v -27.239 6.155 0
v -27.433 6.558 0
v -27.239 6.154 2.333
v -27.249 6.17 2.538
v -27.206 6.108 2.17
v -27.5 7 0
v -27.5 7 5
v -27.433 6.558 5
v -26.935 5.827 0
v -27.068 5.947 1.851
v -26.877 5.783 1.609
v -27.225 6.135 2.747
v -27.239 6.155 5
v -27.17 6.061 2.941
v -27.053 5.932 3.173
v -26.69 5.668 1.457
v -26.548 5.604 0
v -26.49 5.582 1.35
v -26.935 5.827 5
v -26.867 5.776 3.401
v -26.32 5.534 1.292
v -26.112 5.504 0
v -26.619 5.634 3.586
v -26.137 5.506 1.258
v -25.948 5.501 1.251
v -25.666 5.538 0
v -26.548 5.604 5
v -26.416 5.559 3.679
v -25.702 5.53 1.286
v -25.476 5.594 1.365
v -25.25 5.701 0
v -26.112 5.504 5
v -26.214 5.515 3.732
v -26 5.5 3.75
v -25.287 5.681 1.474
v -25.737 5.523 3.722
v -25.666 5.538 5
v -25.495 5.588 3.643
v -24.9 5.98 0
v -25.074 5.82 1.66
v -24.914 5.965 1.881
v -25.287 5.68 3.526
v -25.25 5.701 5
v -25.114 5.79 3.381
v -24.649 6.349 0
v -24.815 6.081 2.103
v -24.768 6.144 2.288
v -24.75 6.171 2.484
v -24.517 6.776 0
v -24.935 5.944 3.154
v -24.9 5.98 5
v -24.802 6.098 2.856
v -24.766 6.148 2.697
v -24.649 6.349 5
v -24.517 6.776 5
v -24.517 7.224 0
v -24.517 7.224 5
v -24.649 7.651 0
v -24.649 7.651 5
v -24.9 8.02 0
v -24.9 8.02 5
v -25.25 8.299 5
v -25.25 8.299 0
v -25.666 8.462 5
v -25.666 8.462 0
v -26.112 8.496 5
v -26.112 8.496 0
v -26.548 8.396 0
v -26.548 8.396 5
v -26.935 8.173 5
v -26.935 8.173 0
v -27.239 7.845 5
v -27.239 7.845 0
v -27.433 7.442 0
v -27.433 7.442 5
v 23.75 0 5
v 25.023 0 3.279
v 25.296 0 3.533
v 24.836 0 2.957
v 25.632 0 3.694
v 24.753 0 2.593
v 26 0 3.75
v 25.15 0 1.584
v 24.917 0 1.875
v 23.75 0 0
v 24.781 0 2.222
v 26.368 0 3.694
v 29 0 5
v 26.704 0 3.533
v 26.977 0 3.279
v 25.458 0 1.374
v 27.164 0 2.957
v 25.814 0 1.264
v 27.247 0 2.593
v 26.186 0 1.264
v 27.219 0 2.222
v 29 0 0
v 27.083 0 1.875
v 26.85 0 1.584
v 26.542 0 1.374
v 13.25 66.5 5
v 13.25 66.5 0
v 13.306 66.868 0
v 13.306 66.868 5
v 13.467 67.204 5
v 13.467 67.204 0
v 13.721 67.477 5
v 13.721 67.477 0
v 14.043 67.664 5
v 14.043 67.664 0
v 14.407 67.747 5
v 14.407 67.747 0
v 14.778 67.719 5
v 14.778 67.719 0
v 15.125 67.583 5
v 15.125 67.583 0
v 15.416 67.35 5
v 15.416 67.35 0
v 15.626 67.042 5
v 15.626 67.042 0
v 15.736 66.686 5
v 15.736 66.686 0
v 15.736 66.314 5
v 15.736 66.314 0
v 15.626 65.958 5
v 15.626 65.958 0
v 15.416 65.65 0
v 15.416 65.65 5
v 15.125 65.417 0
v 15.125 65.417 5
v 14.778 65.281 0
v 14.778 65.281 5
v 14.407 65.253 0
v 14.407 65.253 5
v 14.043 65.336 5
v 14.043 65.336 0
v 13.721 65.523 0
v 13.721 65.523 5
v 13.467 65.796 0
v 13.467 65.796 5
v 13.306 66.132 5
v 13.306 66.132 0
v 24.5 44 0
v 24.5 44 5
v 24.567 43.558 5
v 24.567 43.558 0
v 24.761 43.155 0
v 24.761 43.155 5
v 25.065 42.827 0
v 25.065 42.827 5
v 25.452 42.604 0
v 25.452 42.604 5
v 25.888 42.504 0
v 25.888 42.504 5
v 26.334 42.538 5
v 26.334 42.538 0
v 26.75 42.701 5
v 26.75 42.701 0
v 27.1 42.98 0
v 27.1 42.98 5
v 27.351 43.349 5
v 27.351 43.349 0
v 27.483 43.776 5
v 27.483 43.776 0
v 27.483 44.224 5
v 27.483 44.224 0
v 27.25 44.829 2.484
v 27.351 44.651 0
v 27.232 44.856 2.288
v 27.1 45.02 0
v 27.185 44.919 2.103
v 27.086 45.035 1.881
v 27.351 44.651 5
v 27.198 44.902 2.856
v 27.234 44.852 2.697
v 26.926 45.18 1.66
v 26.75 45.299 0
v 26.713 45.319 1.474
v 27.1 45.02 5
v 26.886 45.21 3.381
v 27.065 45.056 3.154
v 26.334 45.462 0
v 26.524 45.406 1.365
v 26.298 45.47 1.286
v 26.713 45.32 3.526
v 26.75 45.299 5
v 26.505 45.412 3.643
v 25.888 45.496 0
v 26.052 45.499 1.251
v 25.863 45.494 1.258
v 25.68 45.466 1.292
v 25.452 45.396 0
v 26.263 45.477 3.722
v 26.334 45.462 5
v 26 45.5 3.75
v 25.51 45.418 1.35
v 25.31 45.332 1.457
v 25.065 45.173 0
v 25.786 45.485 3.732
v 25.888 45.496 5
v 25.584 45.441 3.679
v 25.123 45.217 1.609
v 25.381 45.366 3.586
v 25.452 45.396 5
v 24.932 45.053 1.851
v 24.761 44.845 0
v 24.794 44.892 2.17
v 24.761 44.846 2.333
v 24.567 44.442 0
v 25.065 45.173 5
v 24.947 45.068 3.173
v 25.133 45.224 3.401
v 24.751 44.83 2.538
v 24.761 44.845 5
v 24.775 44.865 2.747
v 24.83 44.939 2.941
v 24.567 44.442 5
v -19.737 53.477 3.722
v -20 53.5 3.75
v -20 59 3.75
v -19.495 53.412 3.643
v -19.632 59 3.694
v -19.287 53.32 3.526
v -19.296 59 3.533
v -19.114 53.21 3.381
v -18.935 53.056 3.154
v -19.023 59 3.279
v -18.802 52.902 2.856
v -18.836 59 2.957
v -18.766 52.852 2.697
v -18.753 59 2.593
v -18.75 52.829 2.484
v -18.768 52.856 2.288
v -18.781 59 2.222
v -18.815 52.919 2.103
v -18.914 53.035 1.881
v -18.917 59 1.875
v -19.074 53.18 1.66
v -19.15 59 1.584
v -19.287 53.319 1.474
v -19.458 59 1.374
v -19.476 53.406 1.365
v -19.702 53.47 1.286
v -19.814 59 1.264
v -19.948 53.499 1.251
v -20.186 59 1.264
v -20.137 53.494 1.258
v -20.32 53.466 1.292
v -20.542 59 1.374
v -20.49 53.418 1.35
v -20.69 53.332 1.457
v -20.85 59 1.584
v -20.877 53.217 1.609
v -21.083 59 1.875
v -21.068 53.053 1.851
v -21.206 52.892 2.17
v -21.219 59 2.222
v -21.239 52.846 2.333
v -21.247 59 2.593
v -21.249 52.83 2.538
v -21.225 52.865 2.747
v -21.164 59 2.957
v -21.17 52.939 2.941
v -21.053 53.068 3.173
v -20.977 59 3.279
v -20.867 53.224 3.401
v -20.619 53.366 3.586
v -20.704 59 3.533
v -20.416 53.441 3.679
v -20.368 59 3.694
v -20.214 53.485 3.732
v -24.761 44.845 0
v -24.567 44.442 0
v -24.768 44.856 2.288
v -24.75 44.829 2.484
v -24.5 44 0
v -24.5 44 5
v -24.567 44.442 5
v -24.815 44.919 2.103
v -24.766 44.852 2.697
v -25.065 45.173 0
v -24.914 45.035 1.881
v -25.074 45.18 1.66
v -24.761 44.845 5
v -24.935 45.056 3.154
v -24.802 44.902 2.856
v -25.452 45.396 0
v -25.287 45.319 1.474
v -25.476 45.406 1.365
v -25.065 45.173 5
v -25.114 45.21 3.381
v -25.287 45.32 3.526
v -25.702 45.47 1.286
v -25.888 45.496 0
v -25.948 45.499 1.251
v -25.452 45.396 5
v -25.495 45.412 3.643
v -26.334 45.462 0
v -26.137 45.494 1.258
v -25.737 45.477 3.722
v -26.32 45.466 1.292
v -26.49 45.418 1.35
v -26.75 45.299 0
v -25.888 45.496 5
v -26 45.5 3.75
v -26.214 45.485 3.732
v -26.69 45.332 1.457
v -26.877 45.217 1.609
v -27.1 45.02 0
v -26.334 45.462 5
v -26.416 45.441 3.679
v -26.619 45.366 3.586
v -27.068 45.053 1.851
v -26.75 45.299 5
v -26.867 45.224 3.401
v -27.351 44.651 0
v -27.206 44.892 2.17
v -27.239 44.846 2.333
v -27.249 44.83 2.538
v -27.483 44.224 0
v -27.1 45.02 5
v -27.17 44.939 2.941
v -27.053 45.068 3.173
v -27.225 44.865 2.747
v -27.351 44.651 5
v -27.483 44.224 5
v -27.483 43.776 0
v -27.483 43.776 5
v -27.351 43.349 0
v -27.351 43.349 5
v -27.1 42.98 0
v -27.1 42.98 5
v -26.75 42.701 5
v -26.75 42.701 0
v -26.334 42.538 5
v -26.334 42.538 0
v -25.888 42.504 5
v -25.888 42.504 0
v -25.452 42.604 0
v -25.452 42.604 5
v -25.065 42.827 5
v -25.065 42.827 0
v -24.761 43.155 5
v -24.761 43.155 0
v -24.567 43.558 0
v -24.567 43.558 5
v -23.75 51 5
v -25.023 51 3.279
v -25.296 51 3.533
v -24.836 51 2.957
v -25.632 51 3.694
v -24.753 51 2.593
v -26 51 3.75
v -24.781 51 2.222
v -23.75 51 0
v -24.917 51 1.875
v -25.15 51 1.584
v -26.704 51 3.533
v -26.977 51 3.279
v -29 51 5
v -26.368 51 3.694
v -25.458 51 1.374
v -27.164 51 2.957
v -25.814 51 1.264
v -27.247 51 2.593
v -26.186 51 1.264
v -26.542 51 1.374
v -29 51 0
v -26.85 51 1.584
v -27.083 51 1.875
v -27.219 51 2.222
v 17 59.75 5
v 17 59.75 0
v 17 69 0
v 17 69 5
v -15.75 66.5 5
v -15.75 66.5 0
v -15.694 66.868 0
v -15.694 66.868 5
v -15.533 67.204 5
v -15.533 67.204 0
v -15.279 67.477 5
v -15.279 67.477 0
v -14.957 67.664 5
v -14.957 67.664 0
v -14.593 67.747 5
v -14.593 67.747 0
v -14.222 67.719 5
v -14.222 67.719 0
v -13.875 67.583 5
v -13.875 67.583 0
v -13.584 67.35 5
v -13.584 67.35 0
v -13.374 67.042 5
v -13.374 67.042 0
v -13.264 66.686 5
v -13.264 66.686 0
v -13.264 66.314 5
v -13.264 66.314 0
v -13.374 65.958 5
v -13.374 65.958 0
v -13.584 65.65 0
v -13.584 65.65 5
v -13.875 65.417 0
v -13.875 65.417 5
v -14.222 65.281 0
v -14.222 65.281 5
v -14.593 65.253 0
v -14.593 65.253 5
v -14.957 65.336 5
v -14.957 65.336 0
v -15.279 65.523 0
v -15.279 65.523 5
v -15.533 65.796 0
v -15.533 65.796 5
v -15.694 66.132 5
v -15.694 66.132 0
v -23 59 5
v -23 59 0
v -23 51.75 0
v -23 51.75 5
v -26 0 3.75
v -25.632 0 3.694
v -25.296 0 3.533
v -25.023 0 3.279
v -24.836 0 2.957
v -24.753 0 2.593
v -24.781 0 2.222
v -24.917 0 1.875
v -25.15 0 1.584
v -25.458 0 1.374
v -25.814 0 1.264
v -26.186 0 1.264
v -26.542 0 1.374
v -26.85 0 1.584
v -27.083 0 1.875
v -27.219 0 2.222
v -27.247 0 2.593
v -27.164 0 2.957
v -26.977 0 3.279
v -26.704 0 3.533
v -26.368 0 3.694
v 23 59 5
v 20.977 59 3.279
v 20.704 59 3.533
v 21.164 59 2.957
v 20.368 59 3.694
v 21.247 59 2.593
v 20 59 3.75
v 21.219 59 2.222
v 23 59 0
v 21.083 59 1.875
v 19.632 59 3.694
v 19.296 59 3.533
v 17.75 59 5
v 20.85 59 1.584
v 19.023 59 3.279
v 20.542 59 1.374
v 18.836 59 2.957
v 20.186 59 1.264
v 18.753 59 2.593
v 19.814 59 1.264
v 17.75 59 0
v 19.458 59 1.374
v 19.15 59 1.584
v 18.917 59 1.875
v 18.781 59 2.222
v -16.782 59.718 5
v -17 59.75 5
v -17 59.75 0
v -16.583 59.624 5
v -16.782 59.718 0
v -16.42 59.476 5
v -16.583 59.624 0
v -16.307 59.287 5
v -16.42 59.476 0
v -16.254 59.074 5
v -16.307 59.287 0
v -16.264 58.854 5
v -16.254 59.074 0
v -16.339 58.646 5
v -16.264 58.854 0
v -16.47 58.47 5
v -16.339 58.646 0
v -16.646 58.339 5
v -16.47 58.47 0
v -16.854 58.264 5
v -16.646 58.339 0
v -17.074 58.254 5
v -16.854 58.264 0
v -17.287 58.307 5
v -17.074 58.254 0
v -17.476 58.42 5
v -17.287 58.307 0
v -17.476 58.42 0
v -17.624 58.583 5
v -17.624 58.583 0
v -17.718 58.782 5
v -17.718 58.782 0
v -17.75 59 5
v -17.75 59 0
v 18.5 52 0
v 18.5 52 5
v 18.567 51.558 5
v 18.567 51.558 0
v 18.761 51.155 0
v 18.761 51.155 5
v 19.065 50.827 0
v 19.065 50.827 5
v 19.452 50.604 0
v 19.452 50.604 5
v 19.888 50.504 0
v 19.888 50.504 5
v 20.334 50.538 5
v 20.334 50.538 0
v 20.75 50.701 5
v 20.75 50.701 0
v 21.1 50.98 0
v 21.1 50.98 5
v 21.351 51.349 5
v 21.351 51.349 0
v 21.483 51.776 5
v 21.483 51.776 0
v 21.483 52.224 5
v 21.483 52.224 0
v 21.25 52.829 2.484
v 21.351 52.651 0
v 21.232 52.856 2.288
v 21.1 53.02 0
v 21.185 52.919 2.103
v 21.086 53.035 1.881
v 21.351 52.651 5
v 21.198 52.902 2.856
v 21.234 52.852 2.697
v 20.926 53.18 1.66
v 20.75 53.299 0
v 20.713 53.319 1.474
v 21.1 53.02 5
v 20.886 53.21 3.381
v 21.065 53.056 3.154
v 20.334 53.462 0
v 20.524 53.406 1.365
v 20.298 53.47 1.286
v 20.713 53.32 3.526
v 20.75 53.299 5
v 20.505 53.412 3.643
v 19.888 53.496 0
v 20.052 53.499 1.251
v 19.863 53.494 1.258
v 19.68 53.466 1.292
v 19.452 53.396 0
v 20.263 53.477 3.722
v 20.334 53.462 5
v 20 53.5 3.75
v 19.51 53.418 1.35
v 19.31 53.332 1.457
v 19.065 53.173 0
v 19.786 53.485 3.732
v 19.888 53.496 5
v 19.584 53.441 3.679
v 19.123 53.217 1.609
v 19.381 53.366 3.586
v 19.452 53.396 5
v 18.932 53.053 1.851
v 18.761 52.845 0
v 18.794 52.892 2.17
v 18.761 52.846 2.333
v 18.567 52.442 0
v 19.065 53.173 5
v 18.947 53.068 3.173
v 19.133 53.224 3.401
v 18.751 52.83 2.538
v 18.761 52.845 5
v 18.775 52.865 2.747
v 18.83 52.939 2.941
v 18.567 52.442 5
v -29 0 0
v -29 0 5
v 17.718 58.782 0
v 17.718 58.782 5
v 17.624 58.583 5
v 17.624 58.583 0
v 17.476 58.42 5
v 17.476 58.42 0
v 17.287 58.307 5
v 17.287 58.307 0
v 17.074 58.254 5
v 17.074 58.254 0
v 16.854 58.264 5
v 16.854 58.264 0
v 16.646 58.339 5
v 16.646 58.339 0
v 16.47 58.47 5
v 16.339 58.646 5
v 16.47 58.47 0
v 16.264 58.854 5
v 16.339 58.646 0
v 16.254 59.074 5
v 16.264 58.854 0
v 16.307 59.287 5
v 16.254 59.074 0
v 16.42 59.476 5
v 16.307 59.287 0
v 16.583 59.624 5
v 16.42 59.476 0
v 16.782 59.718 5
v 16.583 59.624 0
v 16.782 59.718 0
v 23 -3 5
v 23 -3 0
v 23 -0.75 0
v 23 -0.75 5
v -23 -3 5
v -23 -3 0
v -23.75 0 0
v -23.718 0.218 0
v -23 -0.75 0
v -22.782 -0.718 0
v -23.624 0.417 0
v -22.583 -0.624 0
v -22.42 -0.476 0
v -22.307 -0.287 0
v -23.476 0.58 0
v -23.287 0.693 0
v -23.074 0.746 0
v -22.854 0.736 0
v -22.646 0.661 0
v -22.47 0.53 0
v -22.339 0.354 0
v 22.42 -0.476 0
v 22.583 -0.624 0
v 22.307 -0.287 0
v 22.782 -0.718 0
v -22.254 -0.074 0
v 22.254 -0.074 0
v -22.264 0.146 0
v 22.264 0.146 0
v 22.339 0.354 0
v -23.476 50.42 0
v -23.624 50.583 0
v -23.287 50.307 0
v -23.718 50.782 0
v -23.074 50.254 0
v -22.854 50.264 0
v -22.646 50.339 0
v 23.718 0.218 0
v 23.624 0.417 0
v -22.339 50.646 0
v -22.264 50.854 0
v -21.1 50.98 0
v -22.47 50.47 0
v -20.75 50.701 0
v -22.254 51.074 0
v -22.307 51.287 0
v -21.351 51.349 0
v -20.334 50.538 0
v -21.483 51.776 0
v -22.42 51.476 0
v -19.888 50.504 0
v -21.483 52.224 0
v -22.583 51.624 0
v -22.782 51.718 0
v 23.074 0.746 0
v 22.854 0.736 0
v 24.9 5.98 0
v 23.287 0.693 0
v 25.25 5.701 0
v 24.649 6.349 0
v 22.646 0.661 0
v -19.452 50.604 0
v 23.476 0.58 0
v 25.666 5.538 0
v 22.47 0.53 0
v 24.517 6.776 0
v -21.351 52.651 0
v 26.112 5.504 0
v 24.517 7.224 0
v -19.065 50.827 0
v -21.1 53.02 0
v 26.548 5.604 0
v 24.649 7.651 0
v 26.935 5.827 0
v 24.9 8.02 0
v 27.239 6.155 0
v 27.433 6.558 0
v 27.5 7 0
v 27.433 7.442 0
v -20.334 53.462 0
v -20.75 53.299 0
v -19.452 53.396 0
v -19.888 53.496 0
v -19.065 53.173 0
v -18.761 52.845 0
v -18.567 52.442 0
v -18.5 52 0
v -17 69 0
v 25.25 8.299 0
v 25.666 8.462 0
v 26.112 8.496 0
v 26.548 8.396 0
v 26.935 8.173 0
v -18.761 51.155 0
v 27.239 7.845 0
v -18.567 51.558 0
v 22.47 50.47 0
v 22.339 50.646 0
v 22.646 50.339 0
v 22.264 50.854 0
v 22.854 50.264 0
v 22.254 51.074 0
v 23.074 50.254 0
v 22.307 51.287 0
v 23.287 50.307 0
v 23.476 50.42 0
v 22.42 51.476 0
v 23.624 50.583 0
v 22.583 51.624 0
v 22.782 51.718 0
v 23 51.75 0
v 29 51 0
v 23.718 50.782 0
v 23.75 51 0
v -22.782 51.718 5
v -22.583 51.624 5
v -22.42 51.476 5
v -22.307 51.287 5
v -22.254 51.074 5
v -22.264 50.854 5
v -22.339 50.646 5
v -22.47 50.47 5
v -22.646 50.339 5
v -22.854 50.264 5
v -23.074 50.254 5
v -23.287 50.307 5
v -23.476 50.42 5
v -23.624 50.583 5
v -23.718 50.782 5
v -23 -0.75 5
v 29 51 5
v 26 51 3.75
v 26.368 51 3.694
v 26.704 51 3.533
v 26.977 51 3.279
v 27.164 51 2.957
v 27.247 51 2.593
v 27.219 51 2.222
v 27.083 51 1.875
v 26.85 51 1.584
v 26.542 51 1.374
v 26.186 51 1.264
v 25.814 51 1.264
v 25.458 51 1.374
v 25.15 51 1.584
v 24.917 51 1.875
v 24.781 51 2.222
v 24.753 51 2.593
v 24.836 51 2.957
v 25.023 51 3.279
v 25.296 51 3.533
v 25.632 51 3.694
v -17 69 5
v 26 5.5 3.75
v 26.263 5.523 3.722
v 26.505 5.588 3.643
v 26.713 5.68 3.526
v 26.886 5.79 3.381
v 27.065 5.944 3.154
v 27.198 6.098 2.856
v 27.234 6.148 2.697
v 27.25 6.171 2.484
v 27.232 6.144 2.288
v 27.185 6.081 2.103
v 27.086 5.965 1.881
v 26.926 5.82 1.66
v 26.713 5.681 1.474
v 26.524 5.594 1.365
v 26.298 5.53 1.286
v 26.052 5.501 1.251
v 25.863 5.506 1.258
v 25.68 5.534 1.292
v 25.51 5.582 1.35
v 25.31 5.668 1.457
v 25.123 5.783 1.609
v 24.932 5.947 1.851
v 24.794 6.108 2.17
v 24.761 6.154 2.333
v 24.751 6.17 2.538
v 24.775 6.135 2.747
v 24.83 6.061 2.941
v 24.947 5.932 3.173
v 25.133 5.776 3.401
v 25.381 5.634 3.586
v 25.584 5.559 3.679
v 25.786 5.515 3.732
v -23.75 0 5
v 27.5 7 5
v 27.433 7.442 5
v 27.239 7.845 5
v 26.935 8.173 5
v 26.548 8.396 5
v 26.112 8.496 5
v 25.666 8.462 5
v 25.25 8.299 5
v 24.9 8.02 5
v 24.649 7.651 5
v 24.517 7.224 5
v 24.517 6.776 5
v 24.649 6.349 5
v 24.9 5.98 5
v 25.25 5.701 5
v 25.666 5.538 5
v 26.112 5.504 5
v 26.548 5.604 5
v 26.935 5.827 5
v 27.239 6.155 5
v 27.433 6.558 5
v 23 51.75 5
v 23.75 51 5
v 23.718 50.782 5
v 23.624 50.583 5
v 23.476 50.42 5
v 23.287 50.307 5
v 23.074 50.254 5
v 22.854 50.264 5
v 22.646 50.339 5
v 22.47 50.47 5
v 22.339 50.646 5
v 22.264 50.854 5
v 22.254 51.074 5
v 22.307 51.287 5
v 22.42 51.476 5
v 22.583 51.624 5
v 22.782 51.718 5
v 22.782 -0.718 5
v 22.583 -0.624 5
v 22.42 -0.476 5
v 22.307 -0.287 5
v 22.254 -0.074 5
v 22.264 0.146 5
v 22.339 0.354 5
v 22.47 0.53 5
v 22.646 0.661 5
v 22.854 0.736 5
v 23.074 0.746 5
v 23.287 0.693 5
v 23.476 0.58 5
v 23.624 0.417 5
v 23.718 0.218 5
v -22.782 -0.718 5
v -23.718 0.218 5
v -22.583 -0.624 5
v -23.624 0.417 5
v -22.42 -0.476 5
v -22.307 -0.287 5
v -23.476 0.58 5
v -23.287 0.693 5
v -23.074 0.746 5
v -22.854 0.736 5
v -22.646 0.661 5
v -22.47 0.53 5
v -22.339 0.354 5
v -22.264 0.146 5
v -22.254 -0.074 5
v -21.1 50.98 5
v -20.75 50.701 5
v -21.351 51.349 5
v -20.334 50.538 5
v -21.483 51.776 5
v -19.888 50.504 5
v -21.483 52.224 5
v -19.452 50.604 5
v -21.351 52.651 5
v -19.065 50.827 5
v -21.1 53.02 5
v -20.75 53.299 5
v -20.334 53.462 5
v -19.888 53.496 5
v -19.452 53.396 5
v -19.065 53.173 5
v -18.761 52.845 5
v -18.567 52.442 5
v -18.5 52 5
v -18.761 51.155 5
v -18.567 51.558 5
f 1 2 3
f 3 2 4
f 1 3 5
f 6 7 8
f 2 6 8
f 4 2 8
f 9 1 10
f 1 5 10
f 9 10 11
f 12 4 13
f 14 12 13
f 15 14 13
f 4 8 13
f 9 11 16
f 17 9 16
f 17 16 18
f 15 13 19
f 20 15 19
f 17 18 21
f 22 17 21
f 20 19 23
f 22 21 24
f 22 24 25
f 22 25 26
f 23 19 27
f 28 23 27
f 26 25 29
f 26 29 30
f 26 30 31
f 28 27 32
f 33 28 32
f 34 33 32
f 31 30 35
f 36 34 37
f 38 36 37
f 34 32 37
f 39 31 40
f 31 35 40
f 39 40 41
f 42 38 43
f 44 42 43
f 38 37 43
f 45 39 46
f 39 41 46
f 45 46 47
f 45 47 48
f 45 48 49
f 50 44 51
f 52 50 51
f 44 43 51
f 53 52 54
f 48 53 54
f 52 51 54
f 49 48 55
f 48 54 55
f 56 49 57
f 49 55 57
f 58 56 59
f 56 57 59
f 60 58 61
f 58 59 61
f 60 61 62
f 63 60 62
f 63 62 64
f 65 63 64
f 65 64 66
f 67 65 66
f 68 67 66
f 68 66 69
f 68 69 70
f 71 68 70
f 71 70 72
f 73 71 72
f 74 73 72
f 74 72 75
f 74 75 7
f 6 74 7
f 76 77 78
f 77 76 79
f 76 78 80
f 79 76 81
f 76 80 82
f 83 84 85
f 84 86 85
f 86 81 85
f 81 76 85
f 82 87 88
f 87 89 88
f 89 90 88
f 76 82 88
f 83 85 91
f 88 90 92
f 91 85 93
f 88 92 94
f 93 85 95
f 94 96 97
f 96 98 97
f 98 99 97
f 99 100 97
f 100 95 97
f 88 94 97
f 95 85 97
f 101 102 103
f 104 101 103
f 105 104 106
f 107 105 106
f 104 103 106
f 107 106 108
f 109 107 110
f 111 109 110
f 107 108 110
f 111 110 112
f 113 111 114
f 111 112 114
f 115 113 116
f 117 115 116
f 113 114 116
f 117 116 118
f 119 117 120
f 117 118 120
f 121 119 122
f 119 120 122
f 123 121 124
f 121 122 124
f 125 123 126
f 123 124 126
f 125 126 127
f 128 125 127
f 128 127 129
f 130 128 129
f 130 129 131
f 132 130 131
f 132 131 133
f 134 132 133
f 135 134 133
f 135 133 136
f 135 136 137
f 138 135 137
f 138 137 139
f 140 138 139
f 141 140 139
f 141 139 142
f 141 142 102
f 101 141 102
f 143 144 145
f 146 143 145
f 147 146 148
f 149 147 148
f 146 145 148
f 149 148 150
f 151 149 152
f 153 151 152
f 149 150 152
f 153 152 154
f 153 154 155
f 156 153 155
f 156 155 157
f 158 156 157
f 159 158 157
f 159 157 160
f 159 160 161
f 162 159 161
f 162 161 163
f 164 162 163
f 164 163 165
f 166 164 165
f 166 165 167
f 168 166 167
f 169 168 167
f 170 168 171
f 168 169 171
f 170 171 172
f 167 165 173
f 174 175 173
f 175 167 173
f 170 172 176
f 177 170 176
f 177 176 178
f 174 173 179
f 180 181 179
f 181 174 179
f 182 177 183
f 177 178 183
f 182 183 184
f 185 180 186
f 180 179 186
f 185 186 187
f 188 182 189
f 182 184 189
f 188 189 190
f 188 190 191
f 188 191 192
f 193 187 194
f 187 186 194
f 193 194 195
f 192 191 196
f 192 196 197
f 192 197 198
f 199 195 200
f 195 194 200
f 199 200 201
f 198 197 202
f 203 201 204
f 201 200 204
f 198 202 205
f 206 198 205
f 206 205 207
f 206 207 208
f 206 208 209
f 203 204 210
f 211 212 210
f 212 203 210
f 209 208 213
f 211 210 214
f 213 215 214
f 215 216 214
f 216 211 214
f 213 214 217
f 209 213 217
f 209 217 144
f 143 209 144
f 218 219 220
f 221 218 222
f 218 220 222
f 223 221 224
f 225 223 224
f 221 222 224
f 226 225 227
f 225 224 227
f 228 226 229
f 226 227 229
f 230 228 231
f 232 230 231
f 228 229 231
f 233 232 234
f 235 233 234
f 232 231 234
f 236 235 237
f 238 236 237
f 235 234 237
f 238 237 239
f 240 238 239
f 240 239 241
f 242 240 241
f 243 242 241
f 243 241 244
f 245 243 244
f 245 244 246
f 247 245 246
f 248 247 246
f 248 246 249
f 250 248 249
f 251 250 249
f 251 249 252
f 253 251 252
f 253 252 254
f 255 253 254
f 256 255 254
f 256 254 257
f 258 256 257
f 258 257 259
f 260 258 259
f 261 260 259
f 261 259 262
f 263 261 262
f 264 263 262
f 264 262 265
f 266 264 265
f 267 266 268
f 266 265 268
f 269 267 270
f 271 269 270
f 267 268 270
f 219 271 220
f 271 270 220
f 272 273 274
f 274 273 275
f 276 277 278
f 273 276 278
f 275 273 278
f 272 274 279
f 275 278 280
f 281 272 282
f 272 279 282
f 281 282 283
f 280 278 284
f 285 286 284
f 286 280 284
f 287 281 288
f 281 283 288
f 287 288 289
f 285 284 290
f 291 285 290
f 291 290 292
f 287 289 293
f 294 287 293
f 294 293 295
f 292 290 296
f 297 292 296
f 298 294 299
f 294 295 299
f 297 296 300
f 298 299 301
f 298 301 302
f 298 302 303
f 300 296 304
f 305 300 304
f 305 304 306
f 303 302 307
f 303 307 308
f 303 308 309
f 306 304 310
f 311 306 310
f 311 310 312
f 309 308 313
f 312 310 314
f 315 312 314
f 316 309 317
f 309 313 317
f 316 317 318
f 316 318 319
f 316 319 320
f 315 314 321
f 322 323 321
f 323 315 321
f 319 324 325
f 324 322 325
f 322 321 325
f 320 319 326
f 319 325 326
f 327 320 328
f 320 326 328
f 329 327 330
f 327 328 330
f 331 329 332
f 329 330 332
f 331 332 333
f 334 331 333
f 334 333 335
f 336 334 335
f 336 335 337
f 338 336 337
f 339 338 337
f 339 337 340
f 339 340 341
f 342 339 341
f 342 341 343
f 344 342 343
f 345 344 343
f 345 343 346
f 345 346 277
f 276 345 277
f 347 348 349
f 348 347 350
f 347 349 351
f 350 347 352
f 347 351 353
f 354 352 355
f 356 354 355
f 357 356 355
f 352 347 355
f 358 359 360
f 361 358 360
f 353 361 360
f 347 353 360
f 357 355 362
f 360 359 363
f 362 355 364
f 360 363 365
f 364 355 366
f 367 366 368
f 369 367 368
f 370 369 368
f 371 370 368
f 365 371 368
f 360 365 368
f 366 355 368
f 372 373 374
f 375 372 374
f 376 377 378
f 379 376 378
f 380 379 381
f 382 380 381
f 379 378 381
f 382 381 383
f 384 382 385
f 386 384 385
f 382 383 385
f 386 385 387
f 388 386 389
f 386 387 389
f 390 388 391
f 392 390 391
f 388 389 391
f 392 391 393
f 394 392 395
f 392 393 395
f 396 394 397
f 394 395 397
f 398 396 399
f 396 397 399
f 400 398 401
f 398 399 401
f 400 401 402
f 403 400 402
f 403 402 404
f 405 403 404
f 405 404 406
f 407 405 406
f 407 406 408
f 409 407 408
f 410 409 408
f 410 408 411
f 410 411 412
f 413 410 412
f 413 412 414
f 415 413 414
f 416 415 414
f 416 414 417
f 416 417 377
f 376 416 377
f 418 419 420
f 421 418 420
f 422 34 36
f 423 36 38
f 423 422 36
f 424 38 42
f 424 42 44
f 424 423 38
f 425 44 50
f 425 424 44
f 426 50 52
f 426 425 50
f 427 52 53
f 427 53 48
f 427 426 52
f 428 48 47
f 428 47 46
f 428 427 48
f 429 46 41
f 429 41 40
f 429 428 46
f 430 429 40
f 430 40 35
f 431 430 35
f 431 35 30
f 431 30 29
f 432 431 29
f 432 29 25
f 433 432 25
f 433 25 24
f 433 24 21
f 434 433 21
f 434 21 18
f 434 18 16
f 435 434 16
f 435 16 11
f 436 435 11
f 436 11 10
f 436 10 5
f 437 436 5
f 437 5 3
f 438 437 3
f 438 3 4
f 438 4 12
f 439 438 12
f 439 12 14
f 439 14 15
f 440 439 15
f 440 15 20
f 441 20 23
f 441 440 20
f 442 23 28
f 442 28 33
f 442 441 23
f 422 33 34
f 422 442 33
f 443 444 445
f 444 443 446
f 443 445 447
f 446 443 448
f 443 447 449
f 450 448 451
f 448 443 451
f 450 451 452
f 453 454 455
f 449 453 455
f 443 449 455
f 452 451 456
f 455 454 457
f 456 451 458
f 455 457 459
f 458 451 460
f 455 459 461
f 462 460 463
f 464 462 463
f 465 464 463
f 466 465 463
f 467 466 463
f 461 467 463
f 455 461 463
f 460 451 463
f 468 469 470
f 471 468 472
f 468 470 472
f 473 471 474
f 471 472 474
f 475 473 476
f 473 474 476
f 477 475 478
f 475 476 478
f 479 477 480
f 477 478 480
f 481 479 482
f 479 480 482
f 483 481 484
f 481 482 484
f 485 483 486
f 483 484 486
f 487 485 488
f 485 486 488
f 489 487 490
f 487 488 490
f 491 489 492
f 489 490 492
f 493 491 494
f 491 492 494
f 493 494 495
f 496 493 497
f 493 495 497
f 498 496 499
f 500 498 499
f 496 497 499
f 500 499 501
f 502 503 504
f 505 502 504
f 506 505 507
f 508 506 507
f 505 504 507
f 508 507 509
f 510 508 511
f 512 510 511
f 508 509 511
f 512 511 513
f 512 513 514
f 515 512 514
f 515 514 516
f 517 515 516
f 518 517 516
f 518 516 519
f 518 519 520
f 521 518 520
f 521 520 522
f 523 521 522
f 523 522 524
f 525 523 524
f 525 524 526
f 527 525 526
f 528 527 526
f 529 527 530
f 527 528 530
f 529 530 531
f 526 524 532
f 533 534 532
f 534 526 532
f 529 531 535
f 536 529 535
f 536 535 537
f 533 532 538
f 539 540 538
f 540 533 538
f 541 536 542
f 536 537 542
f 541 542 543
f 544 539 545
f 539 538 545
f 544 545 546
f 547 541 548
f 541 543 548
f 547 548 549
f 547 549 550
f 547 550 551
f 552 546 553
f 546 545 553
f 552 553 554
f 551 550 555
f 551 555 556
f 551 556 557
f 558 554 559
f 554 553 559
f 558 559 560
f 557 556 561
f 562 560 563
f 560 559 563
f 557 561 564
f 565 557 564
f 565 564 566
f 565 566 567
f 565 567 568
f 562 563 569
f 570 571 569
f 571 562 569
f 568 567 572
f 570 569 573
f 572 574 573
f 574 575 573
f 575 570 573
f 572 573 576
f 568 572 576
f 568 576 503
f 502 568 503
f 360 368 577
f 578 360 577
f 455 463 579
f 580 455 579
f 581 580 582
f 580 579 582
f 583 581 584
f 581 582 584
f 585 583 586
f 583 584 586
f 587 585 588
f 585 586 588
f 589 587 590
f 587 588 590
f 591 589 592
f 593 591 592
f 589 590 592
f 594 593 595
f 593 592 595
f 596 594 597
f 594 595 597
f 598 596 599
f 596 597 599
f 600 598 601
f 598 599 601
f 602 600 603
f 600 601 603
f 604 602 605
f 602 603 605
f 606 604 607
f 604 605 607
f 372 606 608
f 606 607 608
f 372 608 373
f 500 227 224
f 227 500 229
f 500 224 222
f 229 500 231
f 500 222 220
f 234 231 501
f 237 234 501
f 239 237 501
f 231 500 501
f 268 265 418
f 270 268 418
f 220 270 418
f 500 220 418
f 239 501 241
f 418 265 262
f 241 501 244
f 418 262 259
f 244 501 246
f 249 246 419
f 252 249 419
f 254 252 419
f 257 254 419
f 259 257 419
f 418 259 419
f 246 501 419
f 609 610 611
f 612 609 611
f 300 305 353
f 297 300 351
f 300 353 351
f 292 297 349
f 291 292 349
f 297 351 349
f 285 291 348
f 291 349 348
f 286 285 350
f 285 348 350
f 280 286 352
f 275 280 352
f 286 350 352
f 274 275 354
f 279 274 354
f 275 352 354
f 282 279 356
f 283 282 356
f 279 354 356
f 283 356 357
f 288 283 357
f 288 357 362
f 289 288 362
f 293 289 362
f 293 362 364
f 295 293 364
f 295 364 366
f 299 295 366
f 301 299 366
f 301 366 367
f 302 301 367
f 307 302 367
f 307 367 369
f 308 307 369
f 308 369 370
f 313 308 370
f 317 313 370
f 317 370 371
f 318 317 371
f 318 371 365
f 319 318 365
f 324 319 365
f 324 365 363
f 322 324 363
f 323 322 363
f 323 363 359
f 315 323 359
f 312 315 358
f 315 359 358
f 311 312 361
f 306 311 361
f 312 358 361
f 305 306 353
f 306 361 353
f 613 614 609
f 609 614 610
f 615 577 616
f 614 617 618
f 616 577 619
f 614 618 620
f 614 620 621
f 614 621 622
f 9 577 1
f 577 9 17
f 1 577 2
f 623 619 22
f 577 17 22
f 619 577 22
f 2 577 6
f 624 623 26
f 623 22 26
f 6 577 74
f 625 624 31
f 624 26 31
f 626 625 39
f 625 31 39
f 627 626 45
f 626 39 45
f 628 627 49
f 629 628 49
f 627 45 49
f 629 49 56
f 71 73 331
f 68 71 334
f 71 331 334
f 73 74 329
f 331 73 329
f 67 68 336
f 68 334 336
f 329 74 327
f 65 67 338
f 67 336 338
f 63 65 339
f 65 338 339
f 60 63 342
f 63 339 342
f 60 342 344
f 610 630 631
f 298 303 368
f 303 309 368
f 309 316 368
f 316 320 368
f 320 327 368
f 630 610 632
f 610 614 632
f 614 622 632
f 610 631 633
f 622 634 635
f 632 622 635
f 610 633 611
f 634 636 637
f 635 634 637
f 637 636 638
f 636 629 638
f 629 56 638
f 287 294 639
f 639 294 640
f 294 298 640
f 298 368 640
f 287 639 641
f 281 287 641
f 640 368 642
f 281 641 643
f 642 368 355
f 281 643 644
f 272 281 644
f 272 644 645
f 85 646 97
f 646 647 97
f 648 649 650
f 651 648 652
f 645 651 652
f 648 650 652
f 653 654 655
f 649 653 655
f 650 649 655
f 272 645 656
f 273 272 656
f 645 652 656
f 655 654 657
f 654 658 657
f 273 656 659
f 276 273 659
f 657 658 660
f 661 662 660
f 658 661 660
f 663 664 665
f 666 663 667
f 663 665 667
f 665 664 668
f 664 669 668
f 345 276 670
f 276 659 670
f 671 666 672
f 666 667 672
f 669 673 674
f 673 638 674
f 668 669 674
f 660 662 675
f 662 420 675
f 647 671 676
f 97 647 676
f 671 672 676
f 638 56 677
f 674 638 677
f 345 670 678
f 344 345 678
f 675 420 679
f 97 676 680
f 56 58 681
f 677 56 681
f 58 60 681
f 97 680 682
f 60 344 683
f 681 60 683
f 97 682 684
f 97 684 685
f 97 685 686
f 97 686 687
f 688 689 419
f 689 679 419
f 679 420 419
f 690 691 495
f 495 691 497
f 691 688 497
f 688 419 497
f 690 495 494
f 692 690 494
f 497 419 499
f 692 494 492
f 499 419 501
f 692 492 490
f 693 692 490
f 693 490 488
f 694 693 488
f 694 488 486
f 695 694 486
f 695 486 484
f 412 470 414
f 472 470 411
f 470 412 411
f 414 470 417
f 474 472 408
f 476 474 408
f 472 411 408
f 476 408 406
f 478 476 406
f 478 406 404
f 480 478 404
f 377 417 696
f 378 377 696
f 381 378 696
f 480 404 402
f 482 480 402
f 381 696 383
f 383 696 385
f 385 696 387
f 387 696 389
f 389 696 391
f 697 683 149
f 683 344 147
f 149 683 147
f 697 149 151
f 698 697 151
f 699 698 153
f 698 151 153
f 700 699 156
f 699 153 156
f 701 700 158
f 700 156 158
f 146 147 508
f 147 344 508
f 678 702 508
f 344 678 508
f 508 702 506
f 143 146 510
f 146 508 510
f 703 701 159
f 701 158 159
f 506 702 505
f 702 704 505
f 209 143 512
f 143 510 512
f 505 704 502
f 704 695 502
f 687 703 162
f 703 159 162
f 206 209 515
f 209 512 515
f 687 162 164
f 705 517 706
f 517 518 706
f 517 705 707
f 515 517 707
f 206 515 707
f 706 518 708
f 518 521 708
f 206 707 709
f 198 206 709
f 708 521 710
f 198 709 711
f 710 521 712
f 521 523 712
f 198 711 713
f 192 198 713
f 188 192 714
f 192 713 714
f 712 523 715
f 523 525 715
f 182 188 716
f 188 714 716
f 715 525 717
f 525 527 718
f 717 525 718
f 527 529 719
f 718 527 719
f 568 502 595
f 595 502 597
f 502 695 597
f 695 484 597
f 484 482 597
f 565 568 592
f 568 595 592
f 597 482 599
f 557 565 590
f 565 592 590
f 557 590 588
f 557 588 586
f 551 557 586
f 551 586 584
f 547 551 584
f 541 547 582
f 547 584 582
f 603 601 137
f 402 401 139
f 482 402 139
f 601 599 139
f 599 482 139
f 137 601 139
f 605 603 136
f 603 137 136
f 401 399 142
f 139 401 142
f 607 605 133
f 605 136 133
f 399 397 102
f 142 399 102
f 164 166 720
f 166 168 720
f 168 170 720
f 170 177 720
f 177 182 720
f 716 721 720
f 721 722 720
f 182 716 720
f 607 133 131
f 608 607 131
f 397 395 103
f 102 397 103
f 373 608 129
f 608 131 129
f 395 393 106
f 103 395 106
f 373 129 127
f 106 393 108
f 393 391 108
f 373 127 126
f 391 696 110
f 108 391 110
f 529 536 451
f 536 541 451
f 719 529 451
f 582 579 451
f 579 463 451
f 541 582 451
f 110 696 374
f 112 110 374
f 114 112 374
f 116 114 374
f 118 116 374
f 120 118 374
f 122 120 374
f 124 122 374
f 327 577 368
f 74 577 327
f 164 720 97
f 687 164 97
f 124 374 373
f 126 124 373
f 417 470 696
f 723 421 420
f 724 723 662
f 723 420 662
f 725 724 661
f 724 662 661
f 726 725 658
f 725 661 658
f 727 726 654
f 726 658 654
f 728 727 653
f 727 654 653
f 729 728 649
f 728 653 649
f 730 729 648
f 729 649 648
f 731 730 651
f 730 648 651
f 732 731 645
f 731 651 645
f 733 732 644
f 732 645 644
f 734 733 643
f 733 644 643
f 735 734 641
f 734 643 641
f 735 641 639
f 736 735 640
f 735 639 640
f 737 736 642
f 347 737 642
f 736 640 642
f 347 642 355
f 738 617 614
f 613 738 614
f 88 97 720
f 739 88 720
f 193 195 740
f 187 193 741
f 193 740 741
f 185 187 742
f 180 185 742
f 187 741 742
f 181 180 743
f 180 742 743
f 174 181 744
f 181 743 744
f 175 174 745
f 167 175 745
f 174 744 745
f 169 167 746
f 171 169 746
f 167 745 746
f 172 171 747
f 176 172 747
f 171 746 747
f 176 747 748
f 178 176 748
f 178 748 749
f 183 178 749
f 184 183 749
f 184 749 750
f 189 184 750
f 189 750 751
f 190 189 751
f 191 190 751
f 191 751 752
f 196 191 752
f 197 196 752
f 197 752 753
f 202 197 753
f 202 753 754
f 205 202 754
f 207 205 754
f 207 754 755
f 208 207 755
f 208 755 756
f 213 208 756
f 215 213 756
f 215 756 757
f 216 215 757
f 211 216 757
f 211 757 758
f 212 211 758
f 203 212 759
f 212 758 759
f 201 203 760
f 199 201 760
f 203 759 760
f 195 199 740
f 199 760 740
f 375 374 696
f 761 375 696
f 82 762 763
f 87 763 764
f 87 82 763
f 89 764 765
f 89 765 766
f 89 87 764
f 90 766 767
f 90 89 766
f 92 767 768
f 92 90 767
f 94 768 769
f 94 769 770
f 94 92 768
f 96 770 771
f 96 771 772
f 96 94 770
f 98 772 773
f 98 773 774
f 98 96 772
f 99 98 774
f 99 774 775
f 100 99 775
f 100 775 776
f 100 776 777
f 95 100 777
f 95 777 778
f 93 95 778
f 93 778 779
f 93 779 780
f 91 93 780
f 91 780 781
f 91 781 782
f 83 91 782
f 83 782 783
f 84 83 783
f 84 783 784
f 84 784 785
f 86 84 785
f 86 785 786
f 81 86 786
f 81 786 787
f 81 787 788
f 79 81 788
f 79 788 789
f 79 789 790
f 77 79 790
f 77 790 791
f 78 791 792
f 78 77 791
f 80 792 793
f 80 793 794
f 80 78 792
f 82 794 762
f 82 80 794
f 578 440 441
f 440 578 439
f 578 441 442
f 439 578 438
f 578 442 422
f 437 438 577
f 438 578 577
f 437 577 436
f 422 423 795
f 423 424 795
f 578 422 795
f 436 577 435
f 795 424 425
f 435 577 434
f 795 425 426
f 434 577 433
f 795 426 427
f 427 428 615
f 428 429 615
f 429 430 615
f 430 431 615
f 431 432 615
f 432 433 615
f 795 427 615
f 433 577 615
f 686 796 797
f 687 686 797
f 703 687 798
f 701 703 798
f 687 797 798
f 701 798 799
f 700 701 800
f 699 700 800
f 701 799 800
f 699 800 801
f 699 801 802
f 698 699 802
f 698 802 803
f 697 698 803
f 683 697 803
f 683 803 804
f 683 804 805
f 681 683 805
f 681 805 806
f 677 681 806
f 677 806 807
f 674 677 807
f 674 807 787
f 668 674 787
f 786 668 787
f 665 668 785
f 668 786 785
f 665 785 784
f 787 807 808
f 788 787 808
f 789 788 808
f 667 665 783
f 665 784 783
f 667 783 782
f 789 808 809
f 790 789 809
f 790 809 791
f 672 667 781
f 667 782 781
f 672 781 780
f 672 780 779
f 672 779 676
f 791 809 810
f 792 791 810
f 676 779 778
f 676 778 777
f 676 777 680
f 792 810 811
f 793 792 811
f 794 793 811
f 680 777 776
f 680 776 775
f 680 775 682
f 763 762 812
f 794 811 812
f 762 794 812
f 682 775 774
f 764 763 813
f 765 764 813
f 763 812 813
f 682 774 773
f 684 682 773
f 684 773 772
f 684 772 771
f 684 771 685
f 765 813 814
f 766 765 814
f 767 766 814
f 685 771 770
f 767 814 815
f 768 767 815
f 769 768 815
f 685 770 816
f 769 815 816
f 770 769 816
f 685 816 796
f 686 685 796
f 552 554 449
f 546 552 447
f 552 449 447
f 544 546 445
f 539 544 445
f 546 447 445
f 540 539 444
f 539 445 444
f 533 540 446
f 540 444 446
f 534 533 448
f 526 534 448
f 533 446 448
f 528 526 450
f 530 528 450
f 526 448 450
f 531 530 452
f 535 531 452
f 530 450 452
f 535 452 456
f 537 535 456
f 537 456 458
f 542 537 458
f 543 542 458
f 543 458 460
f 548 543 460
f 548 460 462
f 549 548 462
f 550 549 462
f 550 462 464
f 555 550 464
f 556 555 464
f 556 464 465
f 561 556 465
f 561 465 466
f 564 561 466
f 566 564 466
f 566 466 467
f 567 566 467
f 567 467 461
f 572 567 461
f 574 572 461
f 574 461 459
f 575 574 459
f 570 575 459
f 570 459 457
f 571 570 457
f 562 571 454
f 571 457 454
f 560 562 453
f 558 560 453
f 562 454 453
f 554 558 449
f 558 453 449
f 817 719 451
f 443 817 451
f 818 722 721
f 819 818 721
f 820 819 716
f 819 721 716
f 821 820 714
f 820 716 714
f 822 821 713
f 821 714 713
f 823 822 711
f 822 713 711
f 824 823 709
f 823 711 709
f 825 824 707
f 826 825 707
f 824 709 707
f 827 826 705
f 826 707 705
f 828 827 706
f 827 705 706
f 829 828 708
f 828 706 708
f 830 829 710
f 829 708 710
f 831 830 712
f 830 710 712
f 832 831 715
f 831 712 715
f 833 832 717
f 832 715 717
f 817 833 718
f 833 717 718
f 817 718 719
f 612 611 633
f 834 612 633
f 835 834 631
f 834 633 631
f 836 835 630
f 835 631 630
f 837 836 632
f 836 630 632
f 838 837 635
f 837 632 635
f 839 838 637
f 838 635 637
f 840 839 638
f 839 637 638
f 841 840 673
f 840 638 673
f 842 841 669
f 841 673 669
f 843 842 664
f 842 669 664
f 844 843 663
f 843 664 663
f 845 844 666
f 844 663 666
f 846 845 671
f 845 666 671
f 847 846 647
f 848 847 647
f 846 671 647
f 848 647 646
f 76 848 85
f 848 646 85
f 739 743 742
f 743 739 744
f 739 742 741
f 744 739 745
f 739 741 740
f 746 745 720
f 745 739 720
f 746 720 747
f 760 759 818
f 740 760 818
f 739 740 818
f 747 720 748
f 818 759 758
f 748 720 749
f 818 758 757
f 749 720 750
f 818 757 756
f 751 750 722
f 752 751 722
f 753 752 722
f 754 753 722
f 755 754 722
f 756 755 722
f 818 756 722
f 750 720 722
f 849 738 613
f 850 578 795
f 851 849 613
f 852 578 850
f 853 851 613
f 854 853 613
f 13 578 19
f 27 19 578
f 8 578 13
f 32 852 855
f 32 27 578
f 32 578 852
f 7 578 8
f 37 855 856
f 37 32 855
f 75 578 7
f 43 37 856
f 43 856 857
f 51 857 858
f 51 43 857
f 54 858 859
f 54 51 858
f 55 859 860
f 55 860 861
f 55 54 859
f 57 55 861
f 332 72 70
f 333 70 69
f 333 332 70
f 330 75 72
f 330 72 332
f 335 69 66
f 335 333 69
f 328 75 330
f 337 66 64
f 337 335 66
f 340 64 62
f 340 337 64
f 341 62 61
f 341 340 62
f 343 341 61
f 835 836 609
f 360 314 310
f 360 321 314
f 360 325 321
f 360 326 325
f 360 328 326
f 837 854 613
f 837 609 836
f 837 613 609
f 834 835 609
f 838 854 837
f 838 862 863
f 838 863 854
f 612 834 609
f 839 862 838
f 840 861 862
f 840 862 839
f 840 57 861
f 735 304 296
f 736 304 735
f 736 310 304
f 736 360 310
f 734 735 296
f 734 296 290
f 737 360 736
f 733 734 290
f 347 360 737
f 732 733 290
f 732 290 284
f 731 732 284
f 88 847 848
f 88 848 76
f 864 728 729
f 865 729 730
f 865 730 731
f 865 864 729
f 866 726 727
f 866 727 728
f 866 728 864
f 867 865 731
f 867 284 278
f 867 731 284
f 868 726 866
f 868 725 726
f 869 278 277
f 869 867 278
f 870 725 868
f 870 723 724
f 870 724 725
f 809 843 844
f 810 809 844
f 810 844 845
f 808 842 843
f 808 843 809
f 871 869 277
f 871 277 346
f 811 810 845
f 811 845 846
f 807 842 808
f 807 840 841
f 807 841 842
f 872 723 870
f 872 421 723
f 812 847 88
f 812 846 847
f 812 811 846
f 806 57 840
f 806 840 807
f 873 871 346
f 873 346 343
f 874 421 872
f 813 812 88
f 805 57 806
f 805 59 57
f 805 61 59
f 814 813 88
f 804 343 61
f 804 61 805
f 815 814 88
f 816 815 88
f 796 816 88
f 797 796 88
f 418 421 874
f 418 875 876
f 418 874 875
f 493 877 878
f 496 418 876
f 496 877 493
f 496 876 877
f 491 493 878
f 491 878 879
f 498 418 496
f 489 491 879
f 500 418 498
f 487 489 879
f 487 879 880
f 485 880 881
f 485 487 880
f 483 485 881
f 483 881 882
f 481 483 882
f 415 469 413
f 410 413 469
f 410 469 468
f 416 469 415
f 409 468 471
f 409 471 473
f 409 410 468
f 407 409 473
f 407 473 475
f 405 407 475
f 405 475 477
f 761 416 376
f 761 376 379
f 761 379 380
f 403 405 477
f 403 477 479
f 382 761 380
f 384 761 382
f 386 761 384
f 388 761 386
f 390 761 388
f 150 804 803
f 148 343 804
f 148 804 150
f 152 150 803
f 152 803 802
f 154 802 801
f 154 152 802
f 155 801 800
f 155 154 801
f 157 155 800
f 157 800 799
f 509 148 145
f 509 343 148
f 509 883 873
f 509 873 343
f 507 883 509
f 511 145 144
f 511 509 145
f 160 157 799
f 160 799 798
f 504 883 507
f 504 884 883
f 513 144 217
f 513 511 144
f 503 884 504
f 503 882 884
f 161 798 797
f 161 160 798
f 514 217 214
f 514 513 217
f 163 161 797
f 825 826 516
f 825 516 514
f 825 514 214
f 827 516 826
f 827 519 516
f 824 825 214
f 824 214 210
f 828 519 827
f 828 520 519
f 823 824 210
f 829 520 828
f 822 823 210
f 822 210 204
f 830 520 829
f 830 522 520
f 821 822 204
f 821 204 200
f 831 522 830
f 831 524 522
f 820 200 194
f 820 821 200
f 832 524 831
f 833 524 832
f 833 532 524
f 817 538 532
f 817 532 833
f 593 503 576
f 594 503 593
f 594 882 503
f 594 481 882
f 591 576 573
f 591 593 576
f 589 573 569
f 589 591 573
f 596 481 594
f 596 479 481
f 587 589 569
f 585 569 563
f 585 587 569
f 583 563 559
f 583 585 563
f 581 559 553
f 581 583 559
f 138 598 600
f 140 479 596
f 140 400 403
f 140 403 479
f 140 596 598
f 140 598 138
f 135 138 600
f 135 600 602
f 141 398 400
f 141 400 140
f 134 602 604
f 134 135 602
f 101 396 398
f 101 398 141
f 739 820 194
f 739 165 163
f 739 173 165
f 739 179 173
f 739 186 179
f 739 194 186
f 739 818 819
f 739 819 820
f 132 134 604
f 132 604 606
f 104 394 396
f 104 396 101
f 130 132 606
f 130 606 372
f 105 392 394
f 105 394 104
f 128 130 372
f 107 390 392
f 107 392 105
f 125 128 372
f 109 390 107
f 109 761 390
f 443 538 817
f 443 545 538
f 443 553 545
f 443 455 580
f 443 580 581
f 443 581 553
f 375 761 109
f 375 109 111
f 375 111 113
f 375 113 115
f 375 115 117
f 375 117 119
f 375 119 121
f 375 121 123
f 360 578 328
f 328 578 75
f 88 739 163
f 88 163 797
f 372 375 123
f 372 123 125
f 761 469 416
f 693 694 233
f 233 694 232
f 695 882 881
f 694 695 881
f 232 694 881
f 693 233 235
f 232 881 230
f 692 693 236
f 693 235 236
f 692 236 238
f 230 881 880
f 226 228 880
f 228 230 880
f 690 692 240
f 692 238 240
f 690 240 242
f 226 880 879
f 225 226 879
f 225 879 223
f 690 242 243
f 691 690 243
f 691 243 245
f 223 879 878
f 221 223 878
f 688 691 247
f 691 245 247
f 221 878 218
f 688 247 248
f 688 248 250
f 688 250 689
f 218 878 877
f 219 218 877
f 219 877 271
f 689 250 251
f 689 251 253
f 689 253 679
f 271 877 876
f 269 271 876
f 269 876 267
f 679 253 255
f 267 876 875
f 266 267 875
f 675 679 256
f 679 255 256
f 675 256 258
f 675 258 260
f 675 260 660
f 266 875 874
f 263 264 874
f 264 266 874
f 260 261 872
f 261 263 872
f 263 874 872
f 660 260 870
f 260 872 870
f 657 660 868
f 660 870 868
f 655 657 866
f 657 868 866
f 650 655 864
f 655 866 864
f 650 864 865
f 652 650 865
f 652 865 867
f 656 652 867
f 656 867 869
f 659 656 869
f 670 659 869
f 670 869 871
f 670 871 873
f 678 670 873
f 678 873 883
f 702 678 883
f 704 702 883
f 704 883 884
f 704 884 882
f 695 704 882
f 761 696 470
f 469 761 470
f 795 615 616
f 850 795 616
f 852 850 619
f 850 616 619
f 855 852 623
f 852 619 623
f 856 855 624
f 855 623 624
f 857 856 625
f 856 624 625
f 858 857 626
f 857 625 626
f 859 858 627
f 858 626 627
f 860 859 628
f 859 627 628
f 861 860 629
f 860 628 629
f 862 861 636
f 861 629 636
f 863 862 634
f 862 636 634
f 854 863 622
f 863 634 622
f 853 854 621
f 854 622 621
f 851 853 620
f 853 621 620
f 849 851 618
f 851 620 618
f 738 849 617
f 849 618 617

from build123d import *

# Parameters (mm, degrees)
EXTRUDE_1_DEPTH     = 5
SKETCH_2_R          = 1.25
CUT_EXTRUDE_1_DEPTH = 7.5
SKETCH_3_R          = 1.25
CUT_EXTRUDE_2_DEPTH = 7.5
SKETCH_4_R          = 1.25
CUT_EXTRUDE_3_DEPTH = 76.013332148
SKETCH_5_R          = 0.75
CUT_EXTRUDE_4_DEPTH = 76.013332148
SKETCH_7_R          = 1.5
CUT_EXTRUDE_6_DEPTH = 76.013332148


with BuildPart() as part:
    # ｽｹｯﾁ1 → ﾎﾞｽ - 押し出し1 (new body)
    with BuildSketch(Plane.XY):
        Polygon((-29, 51), (-29, 0), (-23, 0), (-23, -3), (23, -3), (23, 0), (29, 0), (29, 51), (23, 51), (23, 59), (17, 59), (17, 69), (-17, 69), (-17, 59), (-23, 59), (-23, 51), align=None)
    extrude(amount=EXTRUDE_1_DEPTH)

    # ｽｹｯﾁ2 → ｶｯﾄ - 押し出し1 (cut)
    with BuildSketch(Plane(origin=(0, 59, 0), x_dir=(1, 0, 0), z_dir=(0, 1, 0))):
        with Locations(Location((-20, -2.5, 0), (0, 0, 270))):
            Circle(SKETCH_2_R)
        with Locations(Location((20, -2.5, 0), (0, 0, 270))):
            Circle(SKETCH_2_R)
    extrude(amount=-CUT_EXTRUDE_1_DEPTH, mode=Mode.SUBTRACT)

    # ｽｹｯﾁ3 → ｶｯﾄ - 押し出し2 (cut)
    with BuildSketch(Plane(origin=(0, 51, 0), x_dir=(1, 0, 0), z_dir=(0, 1, 0))):
        with Locations(Location((-26, -2.5, 0), (0, 0, 270))):
            Circle(SKETCH_3_R)
        with Locations(Location((26, -2.5, 0), (0, 0, 270))):
            Circle(SKETCH_3_R)
    cut_extrude_2 = extrude(amount=-CUT_EXTRUDE_2_DEPTH, mode=Mode.SUBTRACT)

    # ﾐﾗｰ1: ｶｯﾄ - 押し出し2 across plane
    add(cut_extrude_2.mirror(Plane.ZX.offset(25.5)), mode=Mode.SUBTRACT)

    # ｽｹｯﾁ4 → ｶｯﾄ - 押し出し3 (cut, through all)
    with BuildSketch(Plane(origin=(0, 0, 0), x_dir=(-1, 0, 0), z_dir=(0, 0, -1))):
        with Locations((-14.5, 66.5)):
            Circle(SKETCH_4_R)
        with Locations((14.5, 66.5)):
            Circle(SKETCH_4_R)
    extrude(amount=-CUT_EXTRUDE_3_DEPTH, mode=Mode.SUBTRACT)

    # ｽｹｯﾁ5 → ｶｯﾄ - 押し出し4 (cut, through all)
    with BuildSketch(Plane(origin=(0, 0, 0), x_dir=(-1, 0, 0), z_dir=(0, 0, -1))):
        with Locations((-17, 59)):
            Circle(SKETCH_5_R)
        with Locations((-23, 51)):
            Circle(SKETCH_5_R)
        with Locations((-23, 0)):
            Circle(SKETCH_5_R)
        with Locations((17, 59)):
            Circle(SKETCH_5_R)
        with Locations((23, 51)):
            Circle(SKETCH_5_R)
        with Locations((23, 0)):
            Circle(SKETCH_5_R)
    extrude(amount=-CUT_EXTRUDE_4_DEPTH, mode=Mode.SUBTRACT)

    # ｽｹｯﾁ7 → ｶｯﾄ - 押し出し6 (cut, through all)
    with BuildSketch(Plane.XY.offset(5)):
        with Locations((-26, 44)):
            Circle(SKETCH_7_R)
        with Locations(Location((-26, 7, 0), (0, 0, 180))):
            Circle(SKETCH_7_R)
        with Locations((-20, 52)):
            Circle(SKETCH_7_R)
        with Locations(Location((20, 52, 0), (0, 0, 180))):
            Circle(SKETCH_7_R)
        with Locations((26, 7)):
            Circle(SKETCH_7_R)
        with Locations(Location((26, 44, 0), (0, 0, 180))):
            Circle(SKETCH_7_R)
    extrude(amount=-CUT_EXTRUDE_6_DEPTH, mode=Mode.SUBTRACT)


solid = part.part
